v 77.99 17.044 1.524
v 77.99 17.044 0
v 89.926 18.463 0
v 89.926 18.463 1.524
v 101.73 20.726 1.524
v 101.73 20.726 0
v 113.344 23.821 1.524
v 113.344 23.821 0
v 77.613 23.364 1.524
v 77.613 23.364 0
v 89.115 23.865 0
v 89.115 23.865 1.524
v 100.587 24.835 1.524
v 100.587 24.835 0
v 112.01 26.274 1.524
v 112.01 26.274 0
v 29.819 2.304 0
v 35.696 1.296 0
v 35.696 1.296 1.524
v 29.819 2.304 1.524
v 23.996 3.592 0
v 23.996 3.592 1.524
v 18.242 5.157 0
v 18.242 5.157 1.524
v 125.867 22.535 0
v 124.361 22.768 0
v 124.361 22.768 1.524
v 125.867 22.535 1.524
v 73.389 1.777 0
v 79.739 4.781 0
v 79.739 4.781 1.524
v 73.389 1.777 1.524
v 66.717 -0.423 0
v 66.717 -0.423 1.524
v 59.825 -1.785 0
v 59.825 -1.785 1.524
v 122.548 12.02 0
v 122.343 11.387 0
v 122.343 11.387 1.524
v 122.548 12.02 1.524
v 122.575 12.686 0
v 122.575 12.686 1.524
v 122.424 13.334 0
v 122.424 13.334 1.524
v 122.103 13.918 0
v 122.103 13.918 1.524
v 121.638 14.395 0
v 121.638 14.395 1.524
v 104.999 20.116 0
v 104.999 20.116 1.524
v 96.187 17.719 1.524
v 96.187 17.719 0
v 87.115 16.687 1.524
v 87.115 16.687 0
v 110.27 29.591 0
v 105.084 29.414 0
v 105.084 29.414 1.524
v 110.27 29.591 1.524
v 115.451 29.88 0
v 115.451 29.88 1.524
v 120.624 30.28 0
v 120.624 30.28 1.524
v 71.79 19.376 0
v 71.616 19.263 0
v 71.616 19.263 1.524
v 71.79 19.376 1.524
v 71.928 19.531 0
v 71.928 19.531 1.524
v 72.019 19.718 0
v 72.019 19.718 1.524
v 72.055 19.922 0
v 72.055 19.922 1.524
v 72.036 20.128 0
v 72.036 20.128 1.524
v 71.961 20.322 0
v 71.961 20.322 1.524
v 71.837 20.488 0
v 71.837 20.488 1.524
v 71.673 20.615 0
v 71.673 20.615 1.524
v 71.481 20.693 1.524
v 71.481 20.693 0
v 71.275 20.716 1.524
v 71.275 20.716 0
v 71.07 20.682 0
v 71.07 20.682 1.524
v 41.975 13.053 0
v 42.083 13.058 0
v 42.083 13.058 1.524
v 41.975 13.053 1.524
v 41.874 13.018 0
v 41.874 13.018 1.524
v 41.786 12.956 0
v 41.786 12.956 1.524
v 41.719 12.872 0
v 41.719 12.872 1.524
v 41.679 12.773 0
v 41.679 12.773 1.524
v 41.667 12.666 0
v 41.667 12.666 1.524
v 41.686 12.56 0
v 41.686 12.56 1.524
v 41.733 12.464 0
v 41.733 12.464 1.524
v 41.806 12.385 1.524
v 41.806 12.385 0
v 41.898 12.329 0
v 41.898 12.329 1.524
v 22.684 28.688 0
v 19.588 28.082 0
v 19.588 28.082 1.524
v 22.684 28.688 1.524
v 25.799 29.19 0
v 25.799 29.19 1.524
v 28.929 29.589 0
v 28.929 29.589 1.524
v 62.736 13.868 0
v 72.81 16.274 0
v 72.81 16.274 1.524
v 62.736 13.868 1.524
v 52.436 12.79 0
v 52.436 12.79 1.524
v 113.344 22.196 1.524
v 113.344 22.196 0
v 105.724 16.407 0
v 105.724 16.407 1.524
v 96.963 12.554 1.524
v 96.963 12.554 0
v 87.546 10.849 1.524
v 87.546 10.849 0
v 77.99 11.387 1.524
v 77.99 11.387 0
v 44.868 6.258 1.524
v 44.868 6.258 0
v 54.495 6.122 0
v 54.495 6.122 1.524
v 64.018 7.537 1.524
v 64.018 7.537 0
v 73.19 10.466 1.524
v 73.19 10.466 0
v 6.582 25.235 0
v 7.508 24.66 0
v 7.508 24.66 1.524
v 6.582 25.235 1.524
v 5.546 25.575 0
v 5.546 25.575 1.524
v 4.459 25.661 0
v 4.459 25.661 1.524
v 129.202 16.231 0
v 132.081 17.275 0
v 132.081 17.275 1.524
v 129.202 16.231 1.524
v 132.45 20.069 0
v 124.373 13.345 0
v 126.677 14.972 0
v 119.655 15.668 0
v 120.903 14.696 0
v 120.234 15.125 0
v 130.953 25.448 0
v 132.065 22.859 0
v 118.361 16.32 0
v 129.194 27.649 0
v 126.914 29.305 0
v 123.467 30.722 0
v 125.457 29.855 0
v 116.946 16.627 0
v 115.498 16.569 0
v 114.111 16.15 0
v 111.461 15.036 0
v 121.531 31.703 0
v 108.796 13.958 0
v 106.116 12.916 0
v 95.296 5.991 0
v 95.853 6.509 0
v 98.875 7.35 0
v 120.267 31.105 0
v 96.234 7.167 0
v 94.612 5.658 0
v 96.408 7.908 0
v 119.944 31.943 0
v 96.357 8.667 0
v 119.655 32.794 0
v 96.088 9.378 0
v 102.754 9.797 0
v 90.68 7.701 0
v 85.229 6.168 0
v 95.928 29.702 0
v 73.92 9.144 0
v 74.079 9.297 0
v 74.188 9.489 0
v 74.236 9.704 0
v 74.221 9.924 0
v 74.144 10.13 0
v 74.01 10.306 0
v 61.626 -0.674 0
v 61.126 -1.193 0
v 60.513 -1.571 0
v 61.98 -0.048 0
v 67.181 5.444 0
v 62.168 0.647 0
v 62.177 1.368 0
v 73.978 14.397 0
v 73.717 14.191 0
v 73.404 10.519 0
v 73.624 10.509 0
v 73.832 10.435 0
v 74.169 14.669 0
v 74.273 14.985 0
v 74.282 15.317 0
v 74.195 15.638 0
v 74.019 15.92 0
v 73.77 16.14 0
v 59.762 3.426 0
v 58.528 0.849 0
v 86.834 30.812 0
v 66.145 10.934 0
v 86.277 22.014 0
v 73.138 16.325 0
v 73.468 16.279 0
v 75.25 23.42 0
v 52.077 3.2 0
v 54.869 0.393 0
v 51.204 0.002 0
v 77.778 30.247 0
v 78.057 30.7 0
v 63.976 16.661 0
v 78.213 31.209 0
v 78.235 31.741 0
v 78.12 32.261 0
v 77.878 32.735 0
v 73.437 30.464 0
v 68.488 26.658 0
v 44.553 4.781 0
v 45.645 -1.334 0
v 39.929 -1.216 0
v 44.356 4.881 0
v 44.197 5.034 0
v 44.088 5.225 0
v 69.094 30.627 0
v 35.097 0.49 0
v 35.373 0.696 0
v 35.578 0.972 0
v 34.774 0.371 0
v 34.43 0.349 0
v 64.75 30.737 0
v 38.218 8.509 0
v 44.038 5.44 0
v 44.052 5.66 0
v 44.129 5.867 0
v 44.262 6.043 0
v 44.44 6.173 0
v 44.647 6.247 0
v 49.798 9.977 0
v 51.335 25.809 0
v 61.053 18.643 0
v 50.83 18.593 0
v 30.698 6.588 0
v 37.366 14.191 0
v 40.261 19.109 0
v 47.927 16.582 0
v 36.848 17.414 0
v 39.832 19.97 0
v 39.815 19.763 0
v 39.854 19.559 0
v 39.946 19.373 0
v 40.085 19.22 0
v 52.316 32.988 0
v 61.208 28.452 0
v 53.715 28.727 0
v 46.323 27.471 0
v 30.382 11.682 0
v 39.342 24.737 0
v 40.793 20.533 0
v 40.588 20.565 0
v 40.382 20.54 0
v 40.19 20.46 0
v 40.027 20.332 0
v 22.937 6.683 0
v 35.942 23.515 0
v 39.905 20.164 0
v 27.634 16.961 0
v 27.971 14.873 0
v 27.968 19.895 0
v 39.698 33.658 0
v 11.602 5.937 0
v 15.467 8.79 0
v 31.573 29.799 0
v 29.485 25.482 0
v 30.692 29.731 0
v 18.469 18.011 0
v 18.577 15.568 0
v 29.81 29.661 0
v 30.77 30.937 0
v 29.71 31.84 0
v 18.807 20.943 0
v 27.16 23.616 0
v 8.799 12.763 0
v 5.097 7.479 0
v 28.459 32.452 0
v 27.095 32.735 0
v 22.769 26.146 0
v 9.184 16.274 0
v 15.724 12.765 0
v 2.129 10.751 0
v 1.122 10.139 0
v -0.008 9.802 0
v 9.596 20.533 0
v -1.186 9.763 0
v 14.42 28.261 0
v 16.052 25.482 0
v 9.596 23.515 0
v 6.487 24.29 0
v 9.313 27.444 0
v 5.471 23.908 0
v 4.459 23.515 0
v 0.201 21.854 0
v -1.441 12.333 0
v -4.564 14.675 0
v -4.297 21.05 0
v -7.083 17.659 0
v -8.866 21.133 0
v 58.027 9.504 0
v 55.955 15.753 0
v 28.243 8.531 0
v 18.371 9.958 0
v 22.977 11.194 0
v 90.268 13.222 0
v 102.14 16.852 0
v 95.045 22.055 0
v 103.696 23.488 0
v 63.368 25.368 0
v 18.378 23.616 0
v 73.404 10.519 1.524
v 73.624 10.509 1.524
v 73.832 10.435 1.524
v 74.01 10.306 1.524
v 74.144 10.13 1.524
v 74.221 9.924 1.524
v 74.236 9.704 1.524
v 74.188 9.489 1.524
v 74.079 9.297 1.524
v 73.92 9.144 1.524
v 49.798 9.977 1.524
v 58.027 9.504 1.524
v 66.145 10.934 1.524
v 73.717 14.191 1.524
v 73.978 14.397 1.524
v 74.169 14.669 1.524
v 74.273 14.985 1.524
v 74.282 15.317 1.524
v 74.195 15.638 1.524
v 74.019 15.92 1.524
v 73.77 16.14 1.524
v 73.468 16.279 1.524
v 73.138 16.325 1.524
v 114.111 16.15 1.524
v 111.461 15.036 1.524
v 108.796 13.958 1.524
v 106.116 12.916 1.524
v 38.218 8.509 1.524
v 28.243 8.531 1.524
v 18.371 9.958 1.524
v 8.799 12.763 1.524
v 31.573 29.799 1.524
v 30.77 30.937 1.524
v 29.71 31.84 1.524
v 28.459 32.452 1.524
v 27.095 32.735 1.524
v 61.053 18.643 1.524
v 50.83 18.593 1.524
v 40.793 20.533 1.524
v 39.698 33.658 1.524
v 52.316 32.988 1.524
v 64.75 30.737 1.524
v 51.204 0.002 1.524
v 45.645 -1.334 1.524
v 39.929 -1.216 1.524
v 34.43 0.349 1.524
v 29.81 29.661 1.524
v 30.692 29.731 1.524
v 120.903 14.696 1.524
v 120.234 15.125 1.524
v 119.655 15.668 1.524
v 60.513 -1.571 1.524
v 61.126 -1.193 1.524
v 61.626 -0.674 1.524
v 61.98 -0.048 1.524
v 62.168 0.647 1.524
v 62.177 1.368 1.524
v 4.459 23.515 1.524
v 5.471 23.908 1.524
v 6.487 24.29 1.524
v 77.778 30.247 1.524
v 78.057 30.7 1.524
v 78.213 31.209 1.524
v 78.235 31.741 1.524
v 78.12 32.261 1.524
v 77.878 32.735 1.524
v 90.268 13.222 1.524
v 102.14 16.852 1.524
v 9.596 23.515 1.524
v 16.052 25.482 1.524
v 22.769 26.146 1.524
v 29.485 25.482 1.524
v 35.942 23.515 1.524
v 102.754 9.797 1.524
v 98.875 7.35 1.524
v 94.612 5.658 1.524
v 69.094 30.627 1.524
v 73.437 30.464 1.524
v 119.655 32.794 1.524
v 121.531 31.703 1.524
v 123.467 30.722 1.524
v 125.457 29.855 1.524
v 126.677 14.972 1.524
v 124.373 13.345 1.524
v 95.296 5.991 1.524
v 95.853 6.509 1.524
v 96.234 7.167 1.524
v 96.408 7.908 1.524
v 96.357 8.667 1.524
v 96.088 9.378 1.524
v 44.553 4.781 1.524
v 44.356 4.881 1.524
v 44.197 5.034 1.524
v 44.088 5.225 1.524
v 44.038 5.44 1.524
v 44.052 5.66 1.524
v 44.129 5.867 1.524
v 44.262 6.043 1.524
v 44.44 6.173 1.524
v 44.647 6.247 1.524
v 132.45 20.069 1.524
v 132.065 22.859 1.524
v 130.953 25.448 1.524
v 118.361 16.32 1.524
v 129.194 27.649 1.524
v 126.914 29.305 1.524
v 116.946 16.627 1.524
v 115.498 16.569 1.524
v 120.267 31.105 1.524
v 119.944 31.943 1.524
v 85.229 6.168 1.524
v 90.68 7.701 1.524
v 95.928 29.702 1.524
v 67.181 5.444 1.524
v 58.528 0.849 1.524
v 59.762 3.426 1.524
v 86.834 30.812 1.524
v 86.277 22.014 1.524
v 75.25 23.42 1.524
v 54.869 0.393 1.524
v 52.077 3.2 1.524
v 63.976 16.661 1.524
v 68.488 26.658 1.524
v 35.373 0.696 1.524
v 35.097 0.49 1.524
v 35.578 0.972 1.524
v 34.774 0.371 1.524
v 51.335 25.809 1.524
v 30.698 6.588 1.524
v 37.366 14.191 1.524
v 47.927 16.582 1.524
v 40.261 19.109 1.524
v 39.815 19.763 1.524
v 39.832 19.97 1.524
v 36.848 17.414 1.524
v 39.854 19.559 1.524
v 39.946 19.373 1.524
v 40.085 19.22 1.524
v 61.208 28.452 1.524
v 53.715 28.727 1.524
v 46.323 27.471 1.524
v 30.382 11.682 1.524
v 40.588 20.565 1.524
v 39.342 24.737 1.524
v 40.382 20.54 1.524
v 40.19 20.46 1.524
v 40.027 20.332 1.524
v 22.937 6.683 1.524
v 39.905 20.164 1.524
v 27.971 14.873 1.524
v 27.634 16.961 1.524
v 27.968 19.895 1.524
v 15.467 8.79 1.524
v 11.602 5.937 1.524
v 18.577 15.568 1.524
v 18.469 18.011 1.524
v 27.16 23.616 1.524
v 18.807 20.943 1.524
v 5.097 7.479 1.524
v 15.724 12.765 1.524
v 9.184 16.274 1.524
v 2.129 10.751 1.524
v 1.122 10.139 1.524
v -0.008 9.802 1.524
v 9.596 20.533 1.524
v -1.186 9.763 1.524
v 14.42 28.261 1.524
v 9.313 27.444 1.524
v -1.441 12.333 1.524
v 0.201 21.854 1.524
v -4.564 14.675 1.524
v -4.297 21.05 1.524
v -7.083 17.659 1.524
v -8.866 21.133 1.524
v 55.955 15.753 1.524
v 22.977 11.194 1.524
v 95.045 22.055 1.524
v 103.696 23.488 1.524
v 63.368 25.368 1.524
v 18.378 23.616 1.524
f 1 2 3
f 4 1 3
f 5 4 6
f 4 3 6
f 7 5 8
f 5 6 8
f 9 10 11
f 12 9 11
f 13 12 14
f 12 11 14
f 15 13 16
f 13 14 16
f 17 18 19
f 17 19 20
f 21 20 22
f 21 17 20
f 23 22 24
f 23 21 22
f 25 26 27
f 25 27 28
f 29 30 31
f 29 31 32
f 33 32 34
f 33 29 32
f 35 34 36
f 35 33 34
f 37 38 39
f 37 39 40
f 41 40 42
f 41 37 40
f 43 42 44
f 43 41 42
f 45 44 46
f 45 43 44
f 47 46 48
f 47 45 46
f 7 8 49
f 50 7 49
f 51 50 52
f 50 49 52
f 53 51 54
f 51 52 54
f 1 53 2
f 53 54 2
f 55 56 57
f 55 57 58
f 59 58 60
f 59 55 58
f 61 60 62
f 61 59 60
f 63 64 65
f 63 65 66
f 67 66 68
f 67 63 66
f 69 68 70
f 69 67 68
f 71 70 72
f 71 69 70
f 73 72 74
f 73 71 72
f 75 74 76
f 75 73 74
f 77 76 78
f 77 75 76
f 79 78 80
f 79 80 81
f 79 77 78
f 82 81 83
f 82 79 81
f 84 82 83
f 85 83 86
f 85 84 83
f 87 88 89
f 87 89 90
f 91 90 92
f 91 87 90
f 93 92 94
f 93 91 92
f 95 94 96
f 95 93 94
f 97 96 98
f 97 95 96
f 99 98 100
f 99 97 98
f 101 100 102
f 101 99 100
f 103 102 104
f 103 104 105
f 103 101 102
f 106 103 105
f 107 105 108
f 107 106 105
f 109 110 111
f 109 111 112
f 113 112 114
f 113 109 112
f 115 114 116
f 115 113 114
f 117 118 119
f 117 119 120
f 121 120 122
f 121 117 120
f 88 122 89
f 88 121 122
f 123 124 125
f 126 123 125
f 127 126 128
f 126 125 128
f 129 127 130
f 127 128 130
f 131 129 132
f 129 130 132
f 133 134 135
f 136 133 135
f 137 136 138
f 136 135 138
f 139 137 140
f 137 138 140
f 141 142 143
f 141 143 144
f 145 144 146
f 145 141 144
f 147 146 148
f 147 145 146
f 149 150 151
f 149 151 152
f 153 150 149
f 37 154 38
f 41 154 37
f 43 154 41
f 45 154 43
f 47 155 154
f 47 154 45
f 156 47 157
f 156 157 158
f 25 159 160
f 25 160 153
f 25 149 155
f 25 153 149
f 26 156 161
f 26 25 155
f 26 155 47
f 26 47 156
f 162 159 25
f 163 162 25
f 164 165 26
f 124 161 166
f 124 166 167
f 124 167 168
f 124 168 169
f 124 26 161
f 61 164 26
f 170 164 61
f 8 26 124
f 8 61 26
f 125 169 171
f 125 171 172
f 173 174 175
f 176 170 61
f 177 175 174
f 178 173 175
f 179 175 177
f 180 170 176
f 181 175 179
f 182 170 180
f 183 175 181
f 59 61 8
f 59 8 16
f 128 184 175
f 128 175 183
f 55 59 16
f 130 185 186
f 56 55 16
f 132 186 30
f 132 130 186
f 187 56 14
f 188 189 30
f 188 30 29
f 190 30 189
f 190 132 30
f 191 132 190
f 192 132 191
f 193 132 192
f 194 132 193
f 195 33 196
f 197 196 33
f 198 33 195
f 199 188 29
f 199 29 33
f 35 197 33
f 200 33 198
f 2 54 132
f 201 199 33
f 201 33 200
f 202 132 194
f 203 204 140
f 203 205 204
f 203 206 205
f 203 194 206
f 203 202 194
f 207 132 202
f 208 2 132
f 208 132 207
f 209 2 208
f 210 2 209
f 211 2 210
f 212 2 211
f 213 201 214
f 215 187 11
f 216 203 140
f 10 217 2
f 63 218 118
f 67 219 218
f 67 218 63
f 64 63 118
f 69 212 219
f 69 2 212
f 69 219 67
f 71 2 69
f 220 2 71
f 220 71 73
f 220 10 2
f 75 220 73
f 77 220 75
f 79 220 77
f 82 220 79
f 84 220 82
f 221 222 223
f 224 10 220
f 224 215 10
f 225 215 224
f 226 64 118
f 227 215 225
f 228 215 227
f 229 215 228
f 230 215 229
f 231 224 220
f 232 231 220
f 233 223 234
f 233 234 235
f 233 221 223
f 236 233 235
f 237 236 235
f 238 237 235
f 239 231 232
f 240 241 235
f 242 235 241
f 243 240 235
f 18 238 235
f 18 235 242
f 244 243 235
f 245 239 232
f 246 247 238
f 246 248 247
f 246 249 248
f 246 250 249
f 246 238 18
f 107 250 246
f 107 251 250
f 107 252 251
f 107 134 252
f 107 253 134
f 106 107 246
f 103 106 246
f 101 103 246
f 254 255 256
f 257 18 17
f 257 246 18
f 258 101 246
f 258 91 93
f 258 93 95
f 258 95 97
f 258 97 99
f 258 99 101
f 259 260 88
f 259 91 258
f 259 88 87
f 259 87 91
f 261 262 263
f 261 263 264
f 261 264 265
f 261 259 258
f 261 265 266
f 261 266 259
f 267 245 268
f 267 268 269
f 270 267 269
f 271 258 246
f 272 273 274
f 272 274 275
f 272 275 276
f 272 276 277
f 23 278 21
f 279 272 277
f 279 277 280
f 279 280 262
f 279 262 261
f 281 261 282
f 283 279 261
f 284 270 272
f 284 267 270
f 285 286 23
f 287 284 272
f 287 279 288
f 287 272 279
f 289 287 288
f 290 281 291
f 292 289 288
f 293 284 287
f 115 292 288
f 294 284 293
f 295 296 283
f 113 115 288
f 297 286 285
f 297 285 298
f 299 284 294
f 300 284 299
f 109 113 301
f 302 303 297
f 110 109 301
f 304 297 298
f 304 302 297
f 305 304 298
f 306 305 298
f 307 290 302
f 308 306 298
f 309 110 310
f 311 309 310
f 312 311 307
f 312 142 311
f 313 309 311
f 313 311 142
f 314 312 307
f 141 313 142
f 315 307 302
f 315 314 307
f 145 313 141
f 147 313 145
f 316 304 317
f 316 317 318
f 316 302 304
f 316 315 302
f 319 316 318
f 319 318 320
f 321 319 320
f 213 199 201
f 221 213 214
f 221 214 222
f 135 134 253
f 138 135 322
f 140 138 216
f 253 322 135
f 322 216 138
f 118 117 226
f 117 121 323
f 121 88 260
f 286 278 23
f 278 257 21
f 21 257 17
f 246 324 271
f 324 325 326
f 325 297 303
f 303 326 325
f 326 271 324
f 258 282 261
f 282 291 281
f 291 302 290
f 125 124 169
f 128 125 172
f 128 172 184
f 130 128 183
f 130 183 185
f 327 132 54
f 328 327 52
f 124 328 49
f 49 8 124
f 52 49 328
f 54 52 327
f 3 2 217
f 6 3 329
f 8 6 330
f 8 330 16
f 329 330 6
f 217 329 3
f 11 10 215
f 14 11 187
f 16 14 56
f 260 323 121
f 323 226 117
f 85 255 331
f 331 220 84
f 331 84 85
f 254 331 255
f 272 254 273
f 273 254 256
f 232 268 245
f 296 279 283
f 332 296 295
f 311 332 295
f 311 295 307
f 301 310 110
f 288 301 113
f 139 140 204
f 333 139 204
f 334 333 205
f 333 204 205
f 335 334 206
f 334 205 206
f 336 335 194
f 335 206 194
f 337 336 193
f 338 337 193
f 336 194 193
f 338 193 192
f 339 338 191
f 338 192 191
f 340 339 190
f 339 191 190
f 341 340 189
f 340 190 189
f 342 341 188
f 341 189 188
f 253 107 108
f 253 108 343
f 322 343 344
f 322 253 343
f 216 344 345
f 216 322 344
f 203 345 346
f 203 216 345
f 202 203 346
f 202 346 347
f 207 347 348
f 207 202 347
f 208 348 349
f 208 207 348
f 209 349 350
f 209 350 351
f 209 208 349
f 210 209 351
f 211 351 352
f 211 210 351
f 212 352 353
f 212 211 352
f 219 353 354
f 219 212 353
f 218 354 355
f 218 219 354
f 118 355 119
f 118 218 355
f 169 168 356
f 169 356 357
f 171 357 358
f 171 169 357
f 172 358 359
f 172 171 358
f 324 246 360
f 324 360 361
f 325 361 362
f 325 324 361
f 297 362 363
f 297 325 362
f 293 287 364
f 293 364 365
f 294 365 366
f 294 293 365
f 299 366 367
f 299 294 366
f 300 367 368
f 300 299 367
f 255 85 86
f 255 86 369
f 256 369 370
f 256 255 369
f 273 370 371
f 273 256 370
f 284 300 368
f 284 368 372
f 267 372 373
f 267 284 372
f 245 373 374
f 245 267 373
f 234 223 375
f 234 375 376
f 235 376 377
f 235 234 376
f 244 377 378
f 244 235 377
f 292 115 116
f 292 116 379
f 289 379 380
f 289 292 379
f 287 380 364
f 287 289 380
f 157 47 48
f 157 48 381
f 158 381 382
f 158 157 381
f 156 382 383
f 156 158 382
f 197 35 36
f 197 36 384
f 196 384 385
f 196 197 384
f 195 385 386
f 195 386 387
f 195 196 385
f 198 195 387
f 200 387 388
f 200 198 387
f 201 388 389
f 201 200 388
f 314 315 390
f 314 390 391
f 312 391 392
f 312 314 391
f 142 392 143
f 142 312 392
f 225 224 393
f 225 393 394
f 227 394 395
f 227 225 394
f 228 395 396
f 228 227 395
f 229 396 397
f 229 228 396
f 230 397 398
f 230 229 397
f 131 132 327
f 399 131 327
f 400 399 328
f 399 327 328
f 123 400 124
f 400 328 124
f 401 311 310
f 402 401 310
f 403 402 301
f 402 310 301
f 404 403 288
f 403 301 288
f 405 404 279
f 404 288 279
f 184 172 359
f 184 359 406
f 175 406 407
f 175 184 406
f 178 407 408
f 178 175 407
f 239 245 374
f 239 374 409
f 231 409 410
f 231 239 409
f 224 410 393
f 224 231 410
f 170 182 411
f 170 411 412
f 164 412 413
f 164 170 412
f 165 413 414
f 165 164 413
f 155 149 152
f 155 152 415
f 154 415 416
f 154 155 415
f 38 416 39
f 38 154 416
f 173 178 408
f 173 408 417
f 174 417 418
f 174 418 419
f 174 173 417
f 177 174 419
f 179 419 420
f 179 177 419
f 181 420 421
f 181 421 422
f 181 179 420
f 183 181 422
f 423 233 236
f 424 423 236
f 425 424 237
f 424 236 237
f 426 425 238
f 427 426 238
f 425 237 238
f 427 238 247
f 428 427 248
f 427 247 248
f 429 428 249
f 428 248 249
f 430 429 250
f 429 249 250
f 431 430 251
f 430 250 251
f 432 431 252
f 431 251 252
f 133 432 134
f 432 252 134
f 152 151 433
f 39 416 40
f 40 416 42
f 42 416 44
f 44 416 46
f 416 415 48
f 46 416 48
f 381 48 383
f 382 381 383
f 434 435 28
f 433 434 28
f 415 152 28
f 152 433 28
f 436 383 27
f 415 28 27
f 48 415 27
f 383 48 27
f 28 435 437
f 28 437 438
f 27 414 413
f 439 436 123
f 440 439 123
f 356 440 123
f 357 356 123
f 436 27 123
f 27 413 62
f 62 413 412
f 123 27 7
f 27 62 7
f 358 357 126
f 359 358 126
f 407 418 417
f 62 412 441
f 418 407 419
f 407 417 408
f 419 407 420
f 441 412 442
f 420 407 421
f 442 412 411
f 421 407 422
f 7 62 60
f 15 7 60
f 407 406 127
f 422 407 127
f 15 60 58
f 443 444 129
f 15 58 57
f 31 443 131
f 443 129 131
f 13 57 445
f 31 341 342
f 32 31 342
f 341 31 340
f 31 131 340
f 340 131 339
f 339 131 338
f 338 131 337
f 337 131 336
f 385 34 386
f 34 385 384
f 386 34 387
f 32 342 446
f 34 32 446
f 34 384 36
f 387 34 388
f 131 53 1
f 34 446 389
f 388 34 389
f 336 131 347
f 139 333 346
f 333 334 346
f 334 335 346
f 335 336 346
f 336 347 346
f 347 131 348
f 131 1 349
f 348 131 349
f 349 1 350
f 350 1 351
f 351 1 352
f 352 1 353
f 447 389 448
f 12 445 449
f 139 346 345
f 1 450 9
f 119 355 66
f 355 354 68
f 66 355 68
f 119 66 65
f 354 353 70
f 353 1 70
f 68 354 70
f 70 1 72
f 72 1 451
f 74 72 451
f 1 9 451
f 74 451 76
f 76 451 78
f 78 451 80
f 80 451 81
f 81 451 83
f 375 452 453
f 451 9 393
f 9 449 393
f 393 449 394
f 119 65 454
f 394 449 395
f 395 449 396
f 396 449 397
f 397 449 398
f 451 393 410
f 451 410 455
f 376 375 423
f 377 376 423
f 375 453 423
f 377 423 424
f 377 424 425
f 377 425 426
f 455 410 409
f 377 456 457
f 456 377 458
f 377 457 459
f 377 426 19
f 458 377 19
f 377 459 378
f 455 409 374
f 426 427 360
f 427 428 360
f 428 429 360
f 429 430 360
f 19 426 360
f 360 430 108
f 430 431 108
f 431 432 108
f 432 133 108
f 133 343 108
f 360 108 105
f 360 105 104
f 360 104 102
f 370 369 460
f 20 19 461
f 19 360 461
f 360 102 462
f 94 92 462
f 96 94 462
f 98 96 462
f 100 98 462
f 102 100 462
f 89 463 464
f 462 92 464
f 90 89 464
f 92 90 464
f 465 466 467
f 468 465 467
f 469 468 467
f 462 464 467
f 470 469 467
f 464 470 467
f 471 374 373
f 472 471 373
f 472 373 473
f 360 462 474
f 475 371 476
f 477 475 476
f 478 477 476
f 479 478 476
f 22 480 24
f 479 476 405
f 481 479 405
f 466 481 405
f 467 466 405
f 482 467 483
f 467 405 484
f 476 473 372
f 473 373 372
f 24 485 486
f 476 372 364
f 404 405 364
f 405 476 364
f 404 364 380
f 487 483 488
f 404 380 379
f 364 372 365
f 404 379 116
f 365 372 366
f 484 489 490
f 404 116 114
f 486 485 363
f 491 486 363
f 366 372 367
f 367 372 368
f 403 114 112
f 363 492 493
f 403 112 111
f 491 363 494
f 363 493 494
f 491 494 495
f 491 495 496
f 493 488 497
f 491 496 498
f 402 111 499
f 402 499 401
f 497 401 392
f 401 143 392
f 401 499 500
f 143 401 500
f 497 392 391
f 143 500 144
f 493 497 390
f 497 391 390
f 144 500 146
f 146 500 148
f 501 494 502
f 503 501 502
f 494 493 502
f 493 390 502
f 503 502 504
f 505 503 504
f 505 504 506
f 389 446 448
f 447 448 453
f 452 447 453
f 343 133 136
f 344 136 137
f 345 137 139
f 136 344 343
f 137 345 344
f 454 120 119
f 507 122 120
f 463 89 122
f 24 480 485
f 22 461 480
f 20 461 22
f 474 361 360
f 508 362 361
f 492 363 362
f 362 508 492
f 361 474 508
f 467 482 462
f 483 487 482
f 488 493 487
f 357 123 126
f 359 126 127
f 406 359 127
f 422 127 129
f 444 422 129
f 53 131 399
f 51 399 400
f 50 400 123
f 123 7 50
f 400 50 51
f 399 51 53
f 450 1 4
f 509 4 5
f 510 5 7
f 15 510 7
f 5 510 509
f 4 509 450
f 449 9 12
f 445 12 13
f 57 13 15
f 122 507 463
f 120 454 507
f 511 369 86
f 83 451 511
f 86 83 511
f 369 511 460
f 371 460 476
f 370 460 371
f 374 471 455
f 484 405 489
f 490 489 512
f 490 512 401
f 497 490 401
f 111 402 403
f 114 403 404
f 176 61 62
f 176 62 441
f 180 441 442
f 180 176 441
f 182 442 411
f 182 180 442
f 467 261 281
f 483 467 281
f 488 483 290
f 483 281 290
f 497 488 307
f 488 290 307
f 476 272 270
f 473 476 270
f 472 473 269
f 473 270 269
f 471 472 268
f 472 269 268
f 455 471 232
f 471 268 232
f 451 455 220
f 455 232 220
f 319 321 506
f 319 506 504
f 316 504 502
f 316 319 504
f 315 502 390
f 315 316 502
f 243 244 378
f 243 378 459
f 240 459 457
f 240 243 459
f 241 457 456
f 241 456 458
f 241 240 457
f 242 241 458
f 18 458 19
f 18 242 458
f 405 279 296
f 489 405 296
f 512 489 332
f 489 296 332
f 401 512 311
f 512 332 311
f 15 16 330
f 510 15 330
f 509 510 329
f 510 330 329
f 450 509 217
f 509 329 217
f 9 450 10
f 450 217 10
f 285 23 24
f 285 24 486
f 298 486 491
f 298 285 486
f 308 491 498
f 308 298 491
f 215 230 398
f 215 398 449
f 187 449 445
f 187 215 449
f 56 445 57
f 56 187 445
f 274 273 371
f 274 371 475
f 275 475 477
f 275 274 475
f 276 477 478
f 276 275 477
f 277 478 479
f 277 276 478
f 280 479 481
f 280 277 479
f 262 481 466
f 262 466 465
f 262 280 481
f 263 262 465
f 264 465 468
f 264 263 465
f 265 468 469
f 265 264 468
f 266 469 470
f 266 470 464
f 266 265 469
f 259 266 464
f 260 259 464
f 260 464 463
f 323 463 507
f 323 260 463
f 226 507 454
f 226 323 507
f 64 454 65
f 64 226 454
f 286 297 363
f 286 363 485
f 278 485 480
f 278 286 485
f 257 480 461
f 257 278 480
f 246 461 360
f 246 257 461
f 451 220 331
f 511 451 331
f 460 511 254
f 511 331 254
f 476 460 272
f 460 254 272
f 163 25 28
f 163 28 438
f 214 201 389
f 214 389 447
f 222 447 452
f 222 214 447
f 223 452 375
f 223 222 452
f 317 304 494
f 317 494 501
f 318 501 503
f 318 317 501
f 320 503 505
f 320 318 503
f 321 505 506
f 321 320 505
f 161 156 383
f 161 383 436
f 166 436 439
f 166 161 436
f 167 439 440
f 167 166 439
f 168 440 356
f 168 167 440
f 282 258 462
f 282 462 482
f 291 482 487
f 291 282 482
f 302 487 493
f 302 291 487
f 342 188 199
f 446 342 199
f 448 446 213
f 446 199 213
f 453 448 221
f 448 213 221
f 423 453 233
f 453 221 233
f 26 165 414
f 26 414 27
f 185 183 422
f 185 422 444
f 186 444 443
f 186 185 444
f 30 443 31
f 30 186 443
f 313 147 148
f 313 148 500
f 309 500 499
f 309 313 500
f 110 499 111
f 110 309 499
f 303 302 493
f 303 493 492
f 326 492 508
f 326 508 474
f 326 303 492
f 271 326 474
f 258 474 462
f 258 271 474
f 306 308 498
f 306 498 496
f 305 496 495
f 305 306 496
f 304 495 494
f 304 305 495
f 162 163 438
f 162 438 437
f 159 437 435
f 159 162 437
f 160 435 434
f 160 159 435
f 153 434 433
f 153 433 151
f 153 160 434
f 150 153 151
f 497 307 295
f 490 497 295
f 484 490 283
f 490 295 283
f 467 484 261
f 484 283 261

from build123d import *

# Parameters (mm, degrees)
BOSS_EXTRUDE1_DEPTH = 1.524


with BuildPart() as part:
    # Model → Boss-Extrude1 (new body)
    with BuildSketch(Plane.XY):
        with BuildLine():
            Line((125.457442265, 29.854729058), (124.36118777, 22.768051361))
            Line((124.36118777, 22.768051361), (125.867274198, 22.535071382))
            Line((125.867274198, 22.535071382), (126.914488667, 29.304732487))
            ThreePointArc((126.914488667, 29.304732487), (131.596034511, 24.191259053), (132.080813549, 17.27537362))
            Line((132.080813549, 17.27537362), (129.201538518, 16.231235276))
            ThreePointArc((129.201538518, 16.231235276), (125.494314224, 14.202109959), (122.342593367, 11.386525267))
            ThreePointArc((122.342593367, 11.386525267), (122.521547644, 13.015286897), (121.637755911, 14.395069943))
            ThreePointArc((121.637755911, 14.395069943), (120.558535261, 14.894839146), (119.655012959, 15.668230327))
            ThreePointArc((119.655012959, 15.668230327), (116.945656671, 16.627230011), (114.111435919, 16.150276533))
            ThreePointArc((114.111435919, 16.150276533), (110.130348083, 14.492411945), (106.116427247, 12.915701804))
            ThreePointArc((106.116427247, 12.915701804), (100.871077069, 8.483544727), (94.612309809, 5.65767367))
            ThreePointArc((94.612309809, 5.65767367), (96.234412345, 7.167311858), (96.088279041, 9.378390589))
            ThreePointArc((96.088279041, 9.378390589), (87.959563224, 6.916430033), (79.738932416, 4.781365698))
            ThreePointArc((79.738932416, 4.781365698), (70.087015382, 0.573629162), (59.825334355, -1.784855875))
            ThreePointArc((59.825334355, -1.784855875), (61.625546567, -0.674388225), (62.177186804, 1.367570505))
            ThreePointArc((62.177186804, 1.367570505), (56.69945513, 0.613180121), (51.20394484, 0.001611808))
            ThreePointArc((51.20394484, 0.001611808), (42.783253785, -1.45847583), (34.430253575, 0.349086412))
            ThreePointArc((34.430253575, 0.349086412), (35.242407465, 0.582998344), (35.696308866, 1.295937508))
            ThreePointArc((35.696308866, 1.295937508), (26.899874012, 2.912690878), (18.24226034, 5.156991018))
            ThreePointArc((18.24226034, 5.156991018), (8.327270493, 6.613476825), (-1.186477097, 9.762600728))
            ThreePointArc((-1.186477097, 9.762600728), (0.567723509, 9.933888345), (2.129376981, 10.751077214))
            ThreePointArc((2.129376981, 10.751077214), (-4.564424076, 14.67509235), (-8.866303828, 21.132545253))
            ThreePointArc((-8.866303828, 21.132545253), (-2.028267146, 21.342243043), (4.458921798, 23.51459164))
            ThreePointArc((4.458921798, 23.51459164), (5.978589155, 24.100559155), (7.508094135, 24.660346004))
            ThreePointArc((7.508094135, 24.660346004), (6.073839254, 25.435989759), (4.458921798, 25.661271599))
            ThreePointArc((4.458921798, 25.661271599), (11.846812063, 27.976344953), (19.588212991, 28.082169784))
            ThreePointArc((19.588212991, 28.082169784), (24.23969735, 28.951914388), (28.92877134, 29.588583491))
            ThreePointArc((28.92877134, 29.588583491), (30.250891965, 29.696247396), (31.57341018, 29.798912074))
            ThreePointArc((31.57341018, 29.798912074), (29.710039, 31.839896858), (27.095456614, 32.73529062))
            ThreePointArc((27.095456614, 32.73529062), (46.017315853, 33.521760077), (64.749650783, 30.73699449))
            ThreePointArc((64.749650783, 30.73699449), (71.265909378, 30.552300799), (77.77761193, 30.246575893))
            ThreePointArc((77.77761193, 30.246575893), (78.240878226, 31.474299031), (77.877808016, 32.73529062))
            ThreePointArc((77.877808016, 32.73529062), (91.368554355, 30.154894712), (105.083859187, 29.413886469))
            ThreePointArc((105.083859187, 29.413886469), (112.860951548, 29.721873992), (120.624125013, 30.279690879))
            ThreePointArc((120.624125013, 30.279690879), (120.101426826, 31.522338532), (119.655012959, 32.794384617))
            ThreePointArc((119.655012959, 32.794384617), (122.492136598, 31.198051004), (125.457442265, 29.854729058))
        make_face()
        with BuildLine():
            ThreePointArc((113.344379689, 22.19615093), (96.963122218, 12.553503985), (77.990394499, 11.386525267))
            ThreePointArc((77.990394499, 11.386525267), (96.271224533, 14.816426058), (113.344379689, 22.19615093))
        make_face(mode=Mode.SUBTRACT)
        with BuildLine():
            ThreePointArc((113.344379689, 23.82080051), (96.187450512, 17.719248724), (77.990394499, 17.043744891))
            ThreePointArc((77.990394499, 17.043744891), (95.848162694, 19.489217449), (113.344379689, 23.82080051))
        make_face(mode=Mode.SUBTRACT)
        with BuildLine():
            ThreePointArc((112.010038699, 26.273742515), (95.04541072, 22.055495603), (77.613248587, 23.363904105))
            ThreePointArc((77.613248587, 23.363904105), (94.856261251, 24.29140484), (112.010038699, 26.273742515))
        make_face(mode=Mode.SUBTRACT)
        with BuildLine():
            ThreePointArc((73.920433764, 9.144198092), (59.762067232, 3.425519676), (44.552717894, 4.781365698))
            ThreePointArc((44.552717894, 4.781365698), (44.052345371, 5.659967485), (44.86760609, 6.258017419))
            ThreePointArc((44.86760609, 6.258017419), (59.284947166, 6.637177896), (73.189879005, 10.465540071))
            ThreePointArc((73.189879005, 10.465540071), (74.143785851, 10.130315533), (73.920433764, 9.144198092))
        make_face(mode=Mode.SUBTRACT)
        with BuildLine():
            ThreePointArc((73.7171882, 14.19085222), (74.195068041, 15.63804442), (72.809895852, 16.27367986))
            ThreePointArc((72.809895852, 16.27367986), (57.603683966, 13.161162203), (42.082533848, 13.058472776))
            ThreePointArc((42.082533848, 13.058472776), (41.678568271, 12.772614258), (41.897709615, 12.328902245))
            ThreePointArc((41.897709615, 12.328902245), (58.027223609, 9.504074716), (73.7171882, 14.19085222))
        make_face(mode=Mode.SUBTRACT)
        with BuildLine():
            ThreePointArc((71.615953494, 19.263251529), (72.005249, 20.227653753), (71.069824737, 20.682190977))
            ThreePointArc((71.069824737, 20.682190977), (55.942470801, 18.367444511), (40.793050931, 20.533077418))
            ThreePointArc((40.793050931, 20.533077418), (39.862149142, 20.069348511), (40.260924923, 19.10882755))
            ThreePointArc((40.260924923, 19.10882755), (55.955346454, 15.753106638), (71.615953494, 19.263251529))
        make_face(mode=Mode.SUBTRACT)
        with BuildLine():
            ThreePointArc((75.249897816, 23.419828185), (57.358073705, 25.777828917), (39.34157015, 24.737090166))
            ThreePointArc((39.34157015, 24.737090166), (57.468271047, 28.781788902), (75.249897816, 23.419828185))
        make_face(mode=Mode.SUBTRACT)
        with BuildLine():
            ThreePointArc((38.218093055, 8.509361046), (23.282181122, 9.069608784), (8.79939997, 12.763440518))
            ThreePointArc((8.79939997, 12.763440518), (22.937130999, 6.683446576), (38.218093055, 8.509361046))
        make_face(mode=Mode.SUBTRACT)
        with BuildLine():
            ThreePointArc((37.366333435, 14.19085222), (23.274365612, 15.219049254), (9.184351398, 16.27367986))
            ThreePointArc((9.184351398, 16.27367986), (22.976923316, 11.194465897), (37.366333435, 14.19085222))
        make_face(mode=Mode.SUBTRACT)
        with BuildLine():
            ThreePointArc((36.84813704, 17.413649418), (23.030567399, 17.299167045), (9.596276919, 20.533077418))
            ThreePointArc((9.596276919, 20.533077418), (23.40846607, 20.600554903), (36.84813704, 17.413649418))
        make_face(mode=Mode.SUBTRACT)
        with BuildLine():
            ThreePointArc((35.94161169, 23.51459164), (22.768944305, 23.628526918), (9.596276919, 23.51459164))
            ThreePointArc((9.596276919, 23.51459164), (22.768944305, 26.146058656), (35.94161169, 23.51459164))
        make_face(mode=Mode.SUBTRACT)
    extrude(amount=BOSS_EXTRUDE1_DEPTH)


solid = part.part
